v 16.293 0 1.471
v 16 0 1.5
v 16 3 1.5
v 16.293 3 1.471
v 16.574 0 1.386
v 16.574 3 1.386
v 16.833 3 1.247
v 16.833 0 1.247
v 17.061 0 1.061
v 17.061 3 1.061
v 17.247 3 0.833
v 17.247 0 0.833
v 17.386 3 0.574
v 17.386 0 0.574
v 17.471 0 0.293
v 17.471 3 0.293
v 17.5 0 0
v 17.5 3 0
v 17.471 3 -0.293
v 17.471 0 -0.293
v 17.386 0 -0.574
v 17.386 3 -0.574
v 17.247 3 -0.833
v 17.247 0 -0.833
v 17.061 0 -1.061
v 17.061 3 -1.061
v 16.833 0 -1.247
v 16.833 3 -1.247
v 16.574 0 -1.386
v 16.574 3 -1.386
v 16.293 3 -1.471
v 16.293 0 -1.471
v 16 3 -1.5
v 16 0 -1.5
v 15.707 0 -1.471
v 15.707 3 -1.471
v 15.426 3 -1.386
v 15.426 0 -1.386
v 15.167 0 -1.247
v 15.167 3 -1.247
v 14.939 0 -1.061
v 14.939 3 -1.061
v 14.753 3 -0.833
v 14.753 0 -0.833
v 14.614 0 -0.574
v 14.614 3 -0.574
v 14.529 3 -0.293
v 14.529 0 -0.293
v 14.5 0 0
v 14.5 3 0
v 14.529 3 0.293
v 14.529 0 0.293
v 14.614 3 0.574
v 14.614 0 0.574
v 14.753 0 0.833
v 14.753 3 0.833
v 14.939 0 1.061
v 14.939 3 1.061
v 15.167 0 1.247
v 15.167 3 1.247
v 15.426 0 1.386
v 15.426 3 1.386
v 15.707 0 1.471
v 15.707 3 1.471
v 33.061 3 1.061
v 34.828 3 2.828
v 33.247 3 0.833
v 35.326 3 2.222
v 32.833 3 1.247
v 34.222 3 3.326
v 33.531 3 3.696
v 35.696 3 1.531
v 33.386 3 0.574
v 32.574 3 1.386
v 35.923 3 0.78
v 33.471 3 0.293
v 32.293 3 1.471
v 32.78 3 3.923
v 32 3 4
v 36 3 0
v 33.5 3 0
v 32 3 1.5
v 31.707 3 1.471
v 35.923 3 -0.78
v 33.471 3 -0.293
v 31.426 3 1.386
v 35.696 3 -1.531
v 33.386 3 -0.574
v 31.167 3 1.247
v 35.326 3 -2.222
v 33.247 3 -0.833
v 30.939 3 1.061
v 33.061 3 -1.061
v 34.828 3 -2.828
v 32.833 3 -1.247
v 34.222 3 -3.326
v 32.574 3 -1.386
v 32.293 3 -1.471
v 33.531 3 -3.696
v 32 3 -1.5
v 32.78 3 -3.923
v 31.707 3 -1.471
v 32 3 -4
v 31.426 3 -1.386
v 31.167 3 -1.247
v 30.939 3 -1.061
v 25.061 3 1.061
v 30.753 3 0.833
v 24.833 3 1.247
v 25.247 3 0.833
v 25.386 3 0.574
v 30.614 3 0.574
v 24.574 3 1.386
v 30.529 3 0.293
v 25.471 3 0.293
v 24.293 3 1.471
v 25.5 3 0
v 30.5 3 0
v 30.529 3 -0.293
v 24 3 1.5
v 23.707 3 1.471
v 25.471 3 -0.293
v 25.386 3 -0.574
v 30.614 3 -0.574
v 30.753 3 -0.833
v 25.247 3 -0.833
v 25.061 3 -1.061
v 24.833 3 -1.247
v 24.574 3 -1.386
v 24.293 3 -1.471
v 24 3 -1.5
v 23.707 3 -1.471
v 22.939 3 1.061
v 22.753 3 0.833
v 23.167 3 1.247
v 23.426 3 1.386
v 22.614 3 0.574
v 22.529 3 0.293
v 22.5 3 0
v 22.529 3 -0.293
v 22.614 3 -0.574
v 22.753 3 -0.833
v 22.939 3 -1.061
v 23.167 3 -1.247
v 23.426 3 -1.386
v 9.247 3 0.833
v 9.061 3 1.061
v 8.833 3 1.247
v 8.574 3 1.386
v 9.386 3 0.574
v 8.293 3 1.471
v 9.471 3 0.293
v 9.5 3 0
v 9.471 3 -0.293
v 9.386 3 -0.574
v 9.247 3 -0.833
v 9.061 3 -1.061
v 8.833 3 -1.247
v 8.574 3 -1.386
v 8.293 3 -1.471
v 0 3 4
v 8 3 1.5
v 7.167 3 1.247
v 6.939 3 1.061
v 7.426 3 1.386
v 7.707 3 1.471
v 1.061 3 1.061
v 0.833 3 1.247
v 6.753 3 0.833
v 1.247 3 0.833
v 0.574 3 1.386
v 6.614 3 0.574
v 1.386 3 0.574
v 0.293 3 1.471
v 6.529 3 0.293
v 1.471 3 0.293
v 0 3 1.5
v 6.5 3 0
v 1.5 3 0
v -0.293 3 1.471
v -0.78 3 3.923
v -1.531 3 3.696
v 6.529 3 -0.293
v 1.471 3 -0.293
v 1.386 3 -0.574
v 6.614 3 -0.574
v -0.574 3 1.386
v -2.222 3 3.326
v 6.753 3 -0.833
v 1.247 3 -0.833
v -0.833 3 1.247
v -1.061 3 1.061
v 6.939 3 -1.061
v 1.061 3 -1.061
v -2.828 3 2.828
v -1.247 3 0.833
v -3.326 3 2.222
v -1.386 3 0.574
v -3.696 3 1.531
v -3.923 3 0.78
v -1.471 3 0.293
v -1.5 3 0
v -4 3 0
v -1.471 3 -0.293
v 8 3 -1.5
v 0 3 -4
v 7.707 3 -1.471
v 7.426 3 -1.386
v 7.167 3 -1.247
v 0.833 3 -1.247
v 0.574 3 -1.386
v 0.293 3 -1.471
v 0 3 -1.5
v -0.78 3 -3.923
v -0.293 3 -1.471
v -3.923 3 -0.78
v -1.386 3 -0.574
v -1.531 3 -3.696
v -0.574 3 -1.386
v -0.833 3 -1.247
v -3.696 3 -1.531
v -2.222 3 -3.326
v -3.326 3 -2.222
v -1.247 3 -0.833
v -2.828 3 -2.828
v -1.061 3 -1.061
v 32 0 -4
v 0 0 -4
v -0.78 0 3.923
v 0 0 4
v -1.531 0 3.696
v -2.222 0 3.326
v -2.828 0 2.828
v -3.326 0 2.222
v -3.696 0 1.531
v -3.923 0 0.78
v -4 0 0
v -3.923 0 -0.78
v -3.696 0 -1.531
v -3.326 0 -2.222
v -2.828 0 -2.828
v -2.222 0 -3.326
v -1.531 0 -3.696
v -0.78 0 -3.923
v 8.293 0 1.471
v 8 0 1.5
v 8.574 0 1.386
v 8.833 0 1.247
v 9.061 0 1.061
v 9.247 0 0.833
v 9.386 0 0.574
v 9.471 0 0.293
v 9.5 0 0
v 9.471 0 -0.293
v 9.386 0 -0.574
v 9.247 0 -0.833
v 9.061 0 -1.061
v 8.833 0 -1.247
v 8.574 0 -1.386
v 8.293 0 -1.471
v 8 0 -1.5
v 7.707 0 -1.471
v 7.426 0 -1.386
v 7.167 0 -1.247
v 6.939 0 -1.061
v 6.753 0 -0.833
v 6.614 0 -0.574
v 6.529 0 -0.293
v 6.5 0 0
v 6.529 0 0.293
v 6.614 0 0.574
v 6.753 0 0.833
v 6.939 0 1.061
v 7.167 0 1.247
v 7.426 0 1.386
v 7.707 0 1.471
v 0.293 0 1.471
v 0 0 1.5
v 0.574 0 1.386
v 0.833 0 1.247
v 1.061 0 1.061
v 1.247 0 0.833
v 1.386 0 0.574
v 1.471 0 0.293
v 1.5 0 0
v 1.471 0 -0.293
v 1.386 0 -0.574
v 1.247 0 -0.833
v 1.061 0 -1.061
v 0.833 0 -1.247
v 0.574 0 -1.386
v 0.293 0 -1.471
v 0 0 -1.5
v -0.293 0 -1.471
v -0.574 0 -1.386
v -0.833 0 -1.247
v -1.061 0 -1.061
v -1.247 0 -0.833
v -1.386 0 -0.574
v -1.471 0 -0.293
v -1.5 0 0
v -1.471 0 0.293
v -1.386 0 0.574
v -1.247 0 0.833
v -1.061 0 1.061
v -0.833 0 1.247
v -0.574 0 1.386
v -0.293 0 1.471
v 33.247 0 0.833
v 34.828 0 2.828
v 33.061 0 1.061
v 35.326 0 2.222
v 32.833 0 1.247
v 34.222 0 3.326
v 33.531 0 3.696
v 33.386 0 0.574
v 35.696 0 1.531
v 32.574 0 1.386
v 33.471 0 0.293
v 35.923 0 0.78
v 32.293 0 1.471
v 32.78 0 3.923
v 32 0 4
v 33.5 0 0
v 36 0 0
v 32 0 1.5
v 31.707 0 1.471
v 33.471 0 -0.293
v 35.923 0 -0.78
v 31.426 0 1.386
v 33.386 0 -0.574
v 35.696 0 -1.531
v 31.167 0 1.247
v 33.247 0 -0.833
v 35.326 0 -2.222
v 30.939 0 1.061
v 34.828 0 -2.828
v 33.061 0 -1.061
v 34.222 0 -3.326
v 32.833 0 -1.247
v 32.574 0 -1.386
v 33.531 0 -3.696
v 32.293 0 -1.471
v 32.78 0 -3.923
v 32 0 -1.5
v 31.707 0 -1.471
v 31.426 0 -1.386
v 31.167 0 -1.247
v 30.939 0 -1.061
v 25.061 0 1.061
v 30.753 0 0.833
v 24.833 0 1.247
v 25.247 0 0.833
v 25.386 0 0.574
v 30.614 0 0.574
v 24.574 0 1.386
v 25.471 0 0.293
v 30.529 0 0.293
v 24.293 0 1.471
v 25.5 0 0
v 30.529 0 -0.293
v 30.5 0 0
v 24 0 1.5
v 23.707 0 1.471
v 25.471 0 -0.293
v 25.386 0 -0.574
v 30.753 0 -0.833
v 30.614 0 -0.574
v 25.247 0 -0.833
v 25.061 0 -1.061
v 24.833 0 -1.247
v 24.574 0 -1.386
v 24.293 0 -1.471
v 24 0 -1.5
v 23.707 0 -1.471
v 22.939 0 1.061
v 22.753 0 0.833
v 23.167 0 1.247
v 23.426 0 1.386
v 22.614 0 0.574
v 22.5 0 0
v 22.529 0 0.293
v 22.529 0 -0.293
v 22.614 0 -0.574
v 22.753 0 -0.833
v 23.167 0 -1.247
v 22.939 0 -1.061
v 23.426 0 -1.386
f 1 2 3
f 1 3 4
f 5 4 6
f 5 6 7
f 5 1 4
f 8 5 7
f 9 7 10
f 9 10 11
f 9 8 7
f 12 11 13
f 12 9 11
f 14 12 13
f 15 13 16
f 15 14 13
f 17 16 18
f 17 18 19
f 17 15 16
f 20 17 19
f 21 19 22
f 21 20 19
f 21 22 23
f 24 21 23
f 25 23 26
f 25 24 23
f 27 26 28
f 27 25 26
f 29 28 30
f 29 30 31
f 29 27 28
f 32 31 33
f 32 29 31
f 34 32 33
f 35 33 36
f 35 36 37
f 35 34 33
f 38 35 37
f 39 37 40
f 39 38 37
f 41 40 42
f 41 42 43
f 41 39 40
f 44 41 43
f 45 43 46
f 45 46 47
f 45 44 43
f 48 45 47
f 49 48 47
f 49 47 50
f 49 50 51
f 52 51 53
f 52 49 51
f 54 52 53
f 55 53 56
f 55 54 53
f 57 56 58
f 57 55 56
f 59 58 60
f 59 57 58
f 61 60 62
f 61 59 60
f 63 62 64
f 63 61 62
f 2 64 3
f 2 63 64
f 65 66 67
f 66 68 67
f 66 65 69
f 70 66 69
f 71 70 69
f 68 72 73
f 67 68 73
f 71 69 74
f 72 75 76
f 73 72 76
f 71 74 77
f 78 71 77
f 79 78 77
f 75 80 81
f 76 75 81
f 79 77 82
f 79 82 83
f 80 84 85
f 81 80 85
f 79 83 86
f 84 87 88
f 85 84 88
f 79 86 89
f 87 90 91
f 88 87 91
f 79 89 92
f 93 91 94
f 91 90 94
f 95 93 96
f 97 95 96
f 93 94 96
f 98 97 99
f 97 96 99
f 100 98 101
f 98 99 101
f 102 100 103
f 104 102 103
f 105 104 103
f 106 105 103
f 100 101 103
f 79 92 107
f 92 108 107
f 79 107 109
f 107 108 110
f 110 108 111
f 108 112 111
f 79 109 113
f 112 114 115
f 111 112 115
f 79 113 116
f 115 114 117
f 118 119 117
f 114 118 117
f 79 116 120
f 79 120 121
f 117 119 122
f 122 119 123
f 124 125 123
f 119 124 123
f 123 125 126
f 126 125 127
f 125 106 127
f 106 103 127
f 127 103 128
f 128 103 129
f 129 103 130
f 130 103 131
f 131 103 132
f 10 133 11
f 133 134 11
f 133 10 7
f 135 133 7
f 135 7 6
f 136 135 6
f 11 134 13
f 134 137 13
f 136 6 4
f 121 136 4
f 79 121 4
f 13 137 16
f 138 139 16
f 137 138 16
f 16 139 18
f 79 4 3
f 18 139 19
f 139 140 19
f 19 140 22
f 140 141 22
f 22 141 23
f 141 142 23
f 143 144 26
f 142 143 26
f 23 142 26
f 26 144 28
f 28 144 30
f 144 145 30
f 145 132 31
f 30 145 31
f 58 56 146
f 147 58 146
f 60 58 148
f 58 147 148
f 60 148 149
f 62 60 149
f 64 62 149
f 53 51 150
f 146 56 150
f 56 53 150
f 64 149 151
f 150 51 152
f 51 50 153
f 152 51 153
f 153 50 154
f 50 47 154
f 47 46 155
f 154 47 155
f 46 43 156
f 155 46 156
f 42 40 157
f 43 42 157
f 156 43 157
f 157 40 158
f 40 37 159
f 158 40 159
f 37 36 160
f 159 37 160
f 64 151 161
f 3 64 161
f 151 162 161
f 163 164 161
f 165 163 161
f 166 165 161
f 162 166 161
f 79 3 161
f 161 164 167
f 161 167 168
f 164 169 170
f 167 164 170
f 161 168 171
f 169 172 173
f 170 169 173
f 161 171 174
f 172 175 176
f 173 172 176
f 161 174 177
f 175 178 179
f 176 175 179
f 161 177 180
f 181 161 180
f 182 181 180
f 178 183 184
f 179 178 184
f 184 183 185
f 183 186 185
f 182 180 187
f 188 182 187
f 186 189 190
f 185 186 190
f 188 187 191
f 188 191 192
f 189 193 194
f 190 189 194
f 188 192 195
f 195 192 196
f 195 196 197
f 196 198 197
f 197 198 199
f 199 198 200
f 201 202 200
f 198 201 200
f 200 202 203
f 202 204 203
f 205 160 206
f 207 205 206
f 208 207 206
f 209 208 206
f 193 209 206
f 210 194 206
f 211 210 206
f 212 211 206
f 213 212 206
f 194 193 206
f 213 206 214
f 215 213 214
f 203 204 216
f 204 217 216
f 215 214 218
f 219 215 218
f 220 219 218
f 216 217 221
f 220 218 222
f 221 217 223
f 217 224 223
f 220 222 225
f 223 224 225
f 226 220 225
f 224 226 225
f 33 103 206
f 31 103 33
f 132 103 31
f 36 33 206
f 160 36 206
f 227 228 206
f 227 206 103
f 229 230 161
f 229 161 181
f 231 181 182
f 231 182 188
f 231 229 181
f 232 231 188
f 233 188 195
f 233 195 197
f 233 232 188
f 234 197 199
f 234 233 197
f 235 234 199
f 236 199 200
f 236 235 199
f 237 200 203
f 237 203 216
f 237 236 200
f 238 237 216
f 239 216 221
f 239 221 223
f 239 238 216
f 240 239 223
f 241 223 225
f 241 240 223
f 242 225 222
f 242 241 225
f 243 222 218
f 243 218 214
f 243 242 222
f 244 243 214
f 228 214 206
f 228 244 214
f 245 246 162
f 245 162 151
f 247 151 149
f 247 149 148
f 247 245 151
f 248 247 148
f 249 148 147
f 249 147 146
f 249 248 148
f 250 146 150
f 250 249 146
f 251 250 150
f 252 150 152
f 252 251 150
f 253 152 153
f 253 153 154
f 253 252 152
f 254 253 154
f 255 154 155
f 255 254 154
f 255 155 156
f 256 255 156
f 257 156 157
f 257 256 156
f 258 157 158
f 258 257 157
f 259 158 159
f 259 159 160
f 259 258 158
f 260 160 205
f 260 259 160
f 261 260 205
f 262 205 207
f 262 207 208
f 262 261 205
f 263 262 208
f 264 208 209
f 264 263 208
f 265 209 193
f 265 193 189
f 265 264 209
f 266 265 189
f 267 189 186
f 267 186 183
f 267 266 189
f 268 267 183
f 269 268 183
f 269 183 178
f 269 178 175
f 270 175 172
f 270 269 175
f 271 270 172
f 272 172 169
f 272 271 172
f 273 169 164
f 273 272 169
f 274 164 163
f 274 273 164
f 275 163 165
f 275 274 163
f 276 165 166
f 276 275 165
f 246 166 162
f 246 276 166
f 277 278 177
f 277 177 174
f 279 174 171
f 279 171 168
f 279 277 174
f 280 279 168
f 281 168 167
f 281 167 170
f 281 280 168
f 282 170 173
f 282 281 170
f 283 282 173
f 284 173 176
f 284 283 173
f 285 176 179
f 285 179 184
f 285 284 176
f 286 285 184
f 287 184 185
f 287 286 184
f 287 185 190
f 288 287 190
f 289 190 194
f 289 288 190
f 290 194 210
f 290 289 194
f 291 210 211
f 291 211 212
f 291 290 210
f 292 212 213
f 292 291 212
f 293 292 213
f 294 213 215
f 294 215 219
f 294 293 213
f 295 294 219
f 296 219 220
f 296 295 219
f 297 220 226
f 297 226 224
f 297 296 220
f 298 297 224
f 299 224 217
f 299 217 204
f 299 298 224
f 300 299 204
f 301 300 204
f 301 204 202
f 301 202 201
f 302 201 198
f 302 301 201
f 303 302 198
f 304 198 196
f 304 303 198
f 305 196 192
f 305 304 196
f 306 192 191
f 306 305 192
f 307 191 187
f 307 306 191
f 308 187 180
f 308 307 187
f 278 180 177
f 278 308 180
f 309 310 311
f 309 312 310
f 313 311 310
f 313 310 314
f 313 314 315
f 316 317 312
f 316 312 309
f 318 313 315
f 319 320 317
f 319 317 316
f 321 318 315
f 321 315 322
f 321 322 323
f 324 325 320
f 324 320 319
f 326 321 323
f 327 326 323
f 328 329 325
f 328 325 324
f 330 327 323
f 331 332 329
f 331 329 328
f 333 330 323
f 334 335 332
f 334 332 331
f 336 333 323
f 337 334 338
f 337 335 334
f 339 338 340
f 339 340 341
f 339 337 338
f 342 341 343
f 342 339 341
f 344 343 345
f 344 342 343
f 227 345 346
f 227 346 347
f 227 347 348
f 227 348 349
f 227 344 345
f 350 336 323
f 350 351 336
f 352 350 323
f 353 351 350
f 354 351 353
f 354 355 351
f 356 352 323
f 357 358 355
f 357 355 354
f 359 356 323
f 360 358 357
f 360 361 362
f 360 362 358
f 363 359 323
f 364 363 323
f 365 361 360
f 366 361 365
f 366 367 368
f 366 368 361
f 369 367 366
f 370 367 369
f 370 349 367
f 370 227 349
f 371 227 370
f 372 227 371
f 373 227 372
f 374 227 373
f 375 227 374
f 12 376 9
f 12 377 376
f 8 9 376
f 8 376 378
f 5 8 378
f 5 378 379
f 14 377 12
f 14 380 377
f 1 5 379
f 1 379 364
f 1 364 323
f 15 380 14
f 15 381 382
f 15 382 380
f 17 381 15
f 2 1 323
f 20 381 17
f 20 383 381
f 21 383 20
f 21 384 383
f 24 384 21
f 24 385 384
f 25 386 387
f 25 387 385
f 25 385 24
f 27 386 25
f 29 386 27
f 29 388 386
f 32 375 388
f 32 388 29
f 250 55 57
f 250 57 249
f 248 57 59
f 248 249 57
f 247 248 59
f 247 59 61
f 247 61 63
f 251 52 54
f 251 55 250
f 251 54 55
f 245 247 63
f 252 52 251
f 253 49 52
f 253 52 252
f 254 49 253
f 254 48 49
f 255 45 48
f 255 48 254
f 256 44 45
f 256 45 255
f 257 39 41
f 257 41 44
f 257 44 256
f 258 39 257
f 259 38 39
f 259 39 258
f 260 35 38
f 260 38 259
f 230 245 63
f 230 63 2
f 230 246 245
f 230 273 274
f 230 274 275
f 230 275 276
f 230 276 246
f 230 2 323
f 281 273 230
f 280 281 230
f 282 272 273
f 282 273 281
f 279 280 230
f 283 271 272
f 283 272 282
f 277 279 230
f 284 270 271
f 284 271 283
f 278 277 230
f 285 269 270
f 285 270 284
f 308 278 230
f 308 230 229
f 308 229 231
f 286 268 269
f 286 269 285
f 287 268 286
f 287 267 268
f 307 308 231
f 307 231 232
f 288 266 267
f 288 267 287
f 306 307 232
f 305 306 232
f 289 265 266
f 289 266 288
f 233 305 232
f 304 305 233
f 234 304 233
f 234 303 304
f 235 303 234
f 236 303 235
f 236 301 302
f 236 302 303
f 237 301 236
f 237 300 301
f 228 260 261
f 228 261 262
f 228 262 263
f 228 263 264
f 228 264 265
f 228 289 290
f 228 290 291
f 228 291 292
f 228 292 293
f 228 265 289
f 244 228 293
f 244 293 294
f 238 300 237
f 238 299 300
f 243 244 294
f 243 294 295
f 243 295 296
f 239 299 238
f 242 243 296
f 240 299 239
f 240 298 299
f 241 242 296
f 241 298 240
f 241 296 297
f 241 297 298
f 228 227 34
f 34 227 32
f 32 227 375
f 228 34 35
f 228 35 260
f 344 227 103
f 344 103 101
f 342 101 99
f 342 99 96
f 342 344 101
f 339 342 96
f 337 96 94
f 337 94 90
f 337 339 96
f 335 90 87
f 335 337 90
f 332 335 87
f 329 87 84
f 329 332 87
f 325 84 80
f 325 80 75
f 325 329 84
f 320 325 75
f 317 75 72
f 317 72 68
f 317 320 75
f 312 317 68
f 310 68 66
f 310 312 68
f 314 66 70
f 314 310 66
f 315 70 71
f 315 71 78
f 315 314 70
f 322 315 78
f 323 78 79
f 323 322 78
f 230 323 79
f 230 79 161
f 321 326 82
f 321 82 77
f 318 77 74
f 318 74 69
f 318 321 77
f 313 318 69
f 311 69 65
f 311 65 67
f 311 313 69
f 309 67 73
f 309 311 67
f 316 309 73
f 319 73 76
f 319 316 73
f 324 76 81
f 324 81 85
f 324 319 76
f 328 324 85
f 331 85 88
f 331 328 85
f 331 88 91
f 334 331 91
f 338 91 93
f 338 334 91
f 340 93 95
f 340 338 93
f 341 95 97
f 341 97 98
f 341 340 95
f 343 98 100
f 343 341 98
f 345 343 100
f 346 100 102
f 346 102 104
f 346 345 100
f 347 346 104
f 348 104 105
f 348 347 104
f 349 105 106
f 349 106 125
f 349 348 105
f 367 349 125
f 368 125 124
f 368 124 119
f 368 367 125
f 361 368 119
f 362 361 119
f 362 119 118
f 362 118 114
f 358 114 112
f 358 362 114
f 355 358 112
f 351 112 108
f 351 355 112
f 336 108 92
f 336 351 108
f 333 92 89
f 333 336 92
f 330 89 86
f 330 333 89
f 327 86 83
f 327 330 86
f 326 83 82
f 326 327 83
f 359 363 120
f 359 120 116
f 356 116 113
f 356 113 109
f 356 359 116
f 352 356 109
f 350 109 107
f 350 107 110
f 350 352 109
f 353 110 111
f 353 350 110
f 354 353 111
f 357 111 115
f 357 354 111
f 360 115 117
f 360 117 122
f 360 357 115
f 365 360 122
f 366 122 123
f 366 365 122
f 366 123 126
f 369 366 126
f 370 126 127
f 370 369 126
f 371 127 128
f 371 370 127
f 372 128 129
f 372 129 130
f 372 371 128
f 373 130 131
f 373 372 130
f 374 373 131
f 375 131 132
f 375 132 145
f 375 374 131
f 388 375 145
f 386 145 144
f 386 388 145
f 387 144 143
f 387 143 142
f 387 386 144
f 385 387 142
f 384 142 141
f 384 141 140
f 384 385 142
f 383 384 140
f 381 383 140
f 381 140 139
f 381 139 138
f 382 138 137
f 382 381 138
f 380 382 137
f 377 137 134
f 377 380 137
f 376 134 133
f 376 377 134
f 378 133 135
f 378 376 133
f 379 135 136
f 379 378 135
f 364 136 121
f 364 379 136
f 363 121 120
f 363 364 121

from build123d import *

# Parameters (mm, degrees)
SKETCH2_R             = 1.5
BOSS_EXTRUDE2_DEPTH   = 3
BOSS_EXTRUDE2_2_DEPTH = 3
BOSS_EXTRUDE2_3_DEPTH = 3
BOSS_EXTRUDE2_4_DEPTH = 3
BOSS_EXTRUDE2_5_DEPTH = 3
BOSS_EXTRUDE2_6_DEPTH = 3
BOSS_EXTRUDE2_7_DEPTH = 3
SKETCH3_W             = 48.454319831
SKETCH3_H             = 7.747522056
CUT_EXTRUDE1_DEPTH    = 10


with BuildPart() as part:
    # Sketch2 → Boss-Extrude2 (new body)
    with BuildSketch(Plane(origin=(0, 0, 0), x_dir=(1, 0, 0), z_dir=(0, 1, 0))):
        with Locations(Location((40, 0, 0), (0, 0, 270))):
            Circle(SKETCH2_R)
    extrude(amount=BOSS_EXTRUDE2_DEPTH)


with BuildPart() as body_2:
    # Sketch2 → Boss-Extrude2 2 (new body)
    with BuildSketch(Plane(origin=(0, 0, 0), x_dir=(1, 0, 0), z_dir=(0, 1, 0))):
        with Locations(Location((48, 0, 0), (0, 0, 270))):
            Circle(SKETCH2_R)
    extrude(amount=BOSS_EXTRUDE2_2_DEPTH)


with BuildPart() as body_3:
    # Sketch2 → Boss-Extrude2 3 (new body)
    with BuildSketch(Plane(origin=(0, 0, 0), x_dir=(1, 0, 0), z_dir=(0, 1, 0))):
        with Locations(Location((56, 0, 0), (0, 0, 270))):
            Circle(SKETCH2_R)
    extrude(amount=BOSS_EXTRUDE2_3_DEPTH)


with BuildPart() as body_4:
    # Sketch2 → Boss-Extrude2 4 (new body)
    with BuildSketch(Plane(origin=(0, 0, 0), x_dir=(1, 0, 0), z_dir=(0, 1, 0))):
        with Locations(Location((64, 0, 0), (0, 0, 270))):
            Circle(SKETCH2_R)
    extrude(amount=BOSS_EXTRUDE2_4_DEPTH)


with BuildPart() as body_5:
    # Sketch2 → Boss-Extrude2 5 (new body)
    with BuildSketch(Plane(origin=(0, 0, 0), x_dir=(1, 0, 0), z_dir=(0, 1, 0))):
        with Locations(Location((72, 0, 0), (0, 0, 270))):
            Circle(SKETCH2_R)
    extrude(amount=BOSS_EXTRUDE2_5_DEPTH)


with BuildPart() as body_6:
    # Sketch2 → Boss-Extrude2 6 (new body)
    with BuildSketch(Plane(origin=(0, 0, 0), x_dir=(1, 0, 0), z_dir=(0, 1, 0))):
        with Locations(Location((80, 0, 0), (0, 0, 270))):
            Circle(SKETCH2_R)
    extrude(amount=BOSS_EXTRUDE2_6_DEPTH)


with BuildPart() as body_7:
    # Sketch2 → Boss-Extrude2 7 (new body)
    with BuildSketch(Plane(origin=(0, 0, 0), x_dir=(1, 0, 0), z_dir=(0, 1, 0))):
        with BuildLine():
            Line((0, 4), (32, 4))
            ThreePointArc((32, 4), (36, 0), (32, -4))
            Line((32, -4), (0, -4))
            ThreePointArc((0, -4), (-4, 0), (0, 4))
        make_face()
        with Locations(Location((0, 0, 0), (0, 0, 270))):
            Circle(SKETCH2_R, mode=Mode.SUBTRACT)
        with Locations(Location((8, 0, 0), (0, 0, 270))):
            Circle(SKETCH2_R, mode=Mode.SUBTRACT)
        with Locations(Location((16, 0, 0), (0, 0, 270))):
            Circle(SKETCH2_R, mode=Mode.SUBTRACT)
        with Locations(Location((24, 0, 0), (0, 0, 270))):
            Circle(SKETCH2_R, mode=Mode.SUBTRACT)
        with Locations(Location((32, 0, 0), (0, 0, 270))):
            Circle(SKETCH2_R, mode=Mode.SUBTRACT)
    extrude(amount=BOSS_EXTRUDE2_7_DEPTH)


with BuildPart() as cut_extrude1_tool:
    # Sketch3 → Cut-Extrude1 (new body)
    with BuildSketch(Plane(origin=(0, 0, 0), x_dir=(-1, 0, 0), z_dir=(0, -1, 0))):
        with Locations((-61.501049379, -0.745868802)):
            Rectangle(SKETCH3_W, SKETCH3_H)
    extrude(amount=-CUT_EXTRUDE1_DEPTH)


with BuildPart() as part_1:
    add(part.part)

    # Cut-Extrude1: cut by cut_extrude1_tool
    add(cut_extrude1_tool.part, mode=Mode.SUBTRACT)


with BuildPart() as body_2_1:
    add(body_2.part)

    # Cut-Extrude1: cut by cut_extrude1_tool
    add(cut_extrude1_tool.part, mode=Mode.SUBTRACT)


with BuildPart() as body_3_1:
    add(body_3.part)

    # Cut-Extrude1: cut by cut_extrude1_tool
    add(cut_extrude1_tool.part, mode=Mode.SUBTRACT)


with BuildPart() as body_4_1:
    add(body_4.part)

    # Cut-Extrude1: cut by cut_extrude1_tool
    add(cut_extrude1_tool.part, mode=Mode.SUBTRACT)


with BuildPart() as body_5_1:
    add(body_5.part)

    # Cut-Extrude1: cut by cut_extrude1_tool
    add(cut_extrude1_tool.part, mode=Mode.SUBTRACT)


with BuildPart() as body_6_1:
    add(body_6.part)

    # Cut-Extrude1: cut by cut_extrude1_tool
    add(cut_extrude1_tool.part, mode=Mode.SUBTRACT)


solid = body_7.part
